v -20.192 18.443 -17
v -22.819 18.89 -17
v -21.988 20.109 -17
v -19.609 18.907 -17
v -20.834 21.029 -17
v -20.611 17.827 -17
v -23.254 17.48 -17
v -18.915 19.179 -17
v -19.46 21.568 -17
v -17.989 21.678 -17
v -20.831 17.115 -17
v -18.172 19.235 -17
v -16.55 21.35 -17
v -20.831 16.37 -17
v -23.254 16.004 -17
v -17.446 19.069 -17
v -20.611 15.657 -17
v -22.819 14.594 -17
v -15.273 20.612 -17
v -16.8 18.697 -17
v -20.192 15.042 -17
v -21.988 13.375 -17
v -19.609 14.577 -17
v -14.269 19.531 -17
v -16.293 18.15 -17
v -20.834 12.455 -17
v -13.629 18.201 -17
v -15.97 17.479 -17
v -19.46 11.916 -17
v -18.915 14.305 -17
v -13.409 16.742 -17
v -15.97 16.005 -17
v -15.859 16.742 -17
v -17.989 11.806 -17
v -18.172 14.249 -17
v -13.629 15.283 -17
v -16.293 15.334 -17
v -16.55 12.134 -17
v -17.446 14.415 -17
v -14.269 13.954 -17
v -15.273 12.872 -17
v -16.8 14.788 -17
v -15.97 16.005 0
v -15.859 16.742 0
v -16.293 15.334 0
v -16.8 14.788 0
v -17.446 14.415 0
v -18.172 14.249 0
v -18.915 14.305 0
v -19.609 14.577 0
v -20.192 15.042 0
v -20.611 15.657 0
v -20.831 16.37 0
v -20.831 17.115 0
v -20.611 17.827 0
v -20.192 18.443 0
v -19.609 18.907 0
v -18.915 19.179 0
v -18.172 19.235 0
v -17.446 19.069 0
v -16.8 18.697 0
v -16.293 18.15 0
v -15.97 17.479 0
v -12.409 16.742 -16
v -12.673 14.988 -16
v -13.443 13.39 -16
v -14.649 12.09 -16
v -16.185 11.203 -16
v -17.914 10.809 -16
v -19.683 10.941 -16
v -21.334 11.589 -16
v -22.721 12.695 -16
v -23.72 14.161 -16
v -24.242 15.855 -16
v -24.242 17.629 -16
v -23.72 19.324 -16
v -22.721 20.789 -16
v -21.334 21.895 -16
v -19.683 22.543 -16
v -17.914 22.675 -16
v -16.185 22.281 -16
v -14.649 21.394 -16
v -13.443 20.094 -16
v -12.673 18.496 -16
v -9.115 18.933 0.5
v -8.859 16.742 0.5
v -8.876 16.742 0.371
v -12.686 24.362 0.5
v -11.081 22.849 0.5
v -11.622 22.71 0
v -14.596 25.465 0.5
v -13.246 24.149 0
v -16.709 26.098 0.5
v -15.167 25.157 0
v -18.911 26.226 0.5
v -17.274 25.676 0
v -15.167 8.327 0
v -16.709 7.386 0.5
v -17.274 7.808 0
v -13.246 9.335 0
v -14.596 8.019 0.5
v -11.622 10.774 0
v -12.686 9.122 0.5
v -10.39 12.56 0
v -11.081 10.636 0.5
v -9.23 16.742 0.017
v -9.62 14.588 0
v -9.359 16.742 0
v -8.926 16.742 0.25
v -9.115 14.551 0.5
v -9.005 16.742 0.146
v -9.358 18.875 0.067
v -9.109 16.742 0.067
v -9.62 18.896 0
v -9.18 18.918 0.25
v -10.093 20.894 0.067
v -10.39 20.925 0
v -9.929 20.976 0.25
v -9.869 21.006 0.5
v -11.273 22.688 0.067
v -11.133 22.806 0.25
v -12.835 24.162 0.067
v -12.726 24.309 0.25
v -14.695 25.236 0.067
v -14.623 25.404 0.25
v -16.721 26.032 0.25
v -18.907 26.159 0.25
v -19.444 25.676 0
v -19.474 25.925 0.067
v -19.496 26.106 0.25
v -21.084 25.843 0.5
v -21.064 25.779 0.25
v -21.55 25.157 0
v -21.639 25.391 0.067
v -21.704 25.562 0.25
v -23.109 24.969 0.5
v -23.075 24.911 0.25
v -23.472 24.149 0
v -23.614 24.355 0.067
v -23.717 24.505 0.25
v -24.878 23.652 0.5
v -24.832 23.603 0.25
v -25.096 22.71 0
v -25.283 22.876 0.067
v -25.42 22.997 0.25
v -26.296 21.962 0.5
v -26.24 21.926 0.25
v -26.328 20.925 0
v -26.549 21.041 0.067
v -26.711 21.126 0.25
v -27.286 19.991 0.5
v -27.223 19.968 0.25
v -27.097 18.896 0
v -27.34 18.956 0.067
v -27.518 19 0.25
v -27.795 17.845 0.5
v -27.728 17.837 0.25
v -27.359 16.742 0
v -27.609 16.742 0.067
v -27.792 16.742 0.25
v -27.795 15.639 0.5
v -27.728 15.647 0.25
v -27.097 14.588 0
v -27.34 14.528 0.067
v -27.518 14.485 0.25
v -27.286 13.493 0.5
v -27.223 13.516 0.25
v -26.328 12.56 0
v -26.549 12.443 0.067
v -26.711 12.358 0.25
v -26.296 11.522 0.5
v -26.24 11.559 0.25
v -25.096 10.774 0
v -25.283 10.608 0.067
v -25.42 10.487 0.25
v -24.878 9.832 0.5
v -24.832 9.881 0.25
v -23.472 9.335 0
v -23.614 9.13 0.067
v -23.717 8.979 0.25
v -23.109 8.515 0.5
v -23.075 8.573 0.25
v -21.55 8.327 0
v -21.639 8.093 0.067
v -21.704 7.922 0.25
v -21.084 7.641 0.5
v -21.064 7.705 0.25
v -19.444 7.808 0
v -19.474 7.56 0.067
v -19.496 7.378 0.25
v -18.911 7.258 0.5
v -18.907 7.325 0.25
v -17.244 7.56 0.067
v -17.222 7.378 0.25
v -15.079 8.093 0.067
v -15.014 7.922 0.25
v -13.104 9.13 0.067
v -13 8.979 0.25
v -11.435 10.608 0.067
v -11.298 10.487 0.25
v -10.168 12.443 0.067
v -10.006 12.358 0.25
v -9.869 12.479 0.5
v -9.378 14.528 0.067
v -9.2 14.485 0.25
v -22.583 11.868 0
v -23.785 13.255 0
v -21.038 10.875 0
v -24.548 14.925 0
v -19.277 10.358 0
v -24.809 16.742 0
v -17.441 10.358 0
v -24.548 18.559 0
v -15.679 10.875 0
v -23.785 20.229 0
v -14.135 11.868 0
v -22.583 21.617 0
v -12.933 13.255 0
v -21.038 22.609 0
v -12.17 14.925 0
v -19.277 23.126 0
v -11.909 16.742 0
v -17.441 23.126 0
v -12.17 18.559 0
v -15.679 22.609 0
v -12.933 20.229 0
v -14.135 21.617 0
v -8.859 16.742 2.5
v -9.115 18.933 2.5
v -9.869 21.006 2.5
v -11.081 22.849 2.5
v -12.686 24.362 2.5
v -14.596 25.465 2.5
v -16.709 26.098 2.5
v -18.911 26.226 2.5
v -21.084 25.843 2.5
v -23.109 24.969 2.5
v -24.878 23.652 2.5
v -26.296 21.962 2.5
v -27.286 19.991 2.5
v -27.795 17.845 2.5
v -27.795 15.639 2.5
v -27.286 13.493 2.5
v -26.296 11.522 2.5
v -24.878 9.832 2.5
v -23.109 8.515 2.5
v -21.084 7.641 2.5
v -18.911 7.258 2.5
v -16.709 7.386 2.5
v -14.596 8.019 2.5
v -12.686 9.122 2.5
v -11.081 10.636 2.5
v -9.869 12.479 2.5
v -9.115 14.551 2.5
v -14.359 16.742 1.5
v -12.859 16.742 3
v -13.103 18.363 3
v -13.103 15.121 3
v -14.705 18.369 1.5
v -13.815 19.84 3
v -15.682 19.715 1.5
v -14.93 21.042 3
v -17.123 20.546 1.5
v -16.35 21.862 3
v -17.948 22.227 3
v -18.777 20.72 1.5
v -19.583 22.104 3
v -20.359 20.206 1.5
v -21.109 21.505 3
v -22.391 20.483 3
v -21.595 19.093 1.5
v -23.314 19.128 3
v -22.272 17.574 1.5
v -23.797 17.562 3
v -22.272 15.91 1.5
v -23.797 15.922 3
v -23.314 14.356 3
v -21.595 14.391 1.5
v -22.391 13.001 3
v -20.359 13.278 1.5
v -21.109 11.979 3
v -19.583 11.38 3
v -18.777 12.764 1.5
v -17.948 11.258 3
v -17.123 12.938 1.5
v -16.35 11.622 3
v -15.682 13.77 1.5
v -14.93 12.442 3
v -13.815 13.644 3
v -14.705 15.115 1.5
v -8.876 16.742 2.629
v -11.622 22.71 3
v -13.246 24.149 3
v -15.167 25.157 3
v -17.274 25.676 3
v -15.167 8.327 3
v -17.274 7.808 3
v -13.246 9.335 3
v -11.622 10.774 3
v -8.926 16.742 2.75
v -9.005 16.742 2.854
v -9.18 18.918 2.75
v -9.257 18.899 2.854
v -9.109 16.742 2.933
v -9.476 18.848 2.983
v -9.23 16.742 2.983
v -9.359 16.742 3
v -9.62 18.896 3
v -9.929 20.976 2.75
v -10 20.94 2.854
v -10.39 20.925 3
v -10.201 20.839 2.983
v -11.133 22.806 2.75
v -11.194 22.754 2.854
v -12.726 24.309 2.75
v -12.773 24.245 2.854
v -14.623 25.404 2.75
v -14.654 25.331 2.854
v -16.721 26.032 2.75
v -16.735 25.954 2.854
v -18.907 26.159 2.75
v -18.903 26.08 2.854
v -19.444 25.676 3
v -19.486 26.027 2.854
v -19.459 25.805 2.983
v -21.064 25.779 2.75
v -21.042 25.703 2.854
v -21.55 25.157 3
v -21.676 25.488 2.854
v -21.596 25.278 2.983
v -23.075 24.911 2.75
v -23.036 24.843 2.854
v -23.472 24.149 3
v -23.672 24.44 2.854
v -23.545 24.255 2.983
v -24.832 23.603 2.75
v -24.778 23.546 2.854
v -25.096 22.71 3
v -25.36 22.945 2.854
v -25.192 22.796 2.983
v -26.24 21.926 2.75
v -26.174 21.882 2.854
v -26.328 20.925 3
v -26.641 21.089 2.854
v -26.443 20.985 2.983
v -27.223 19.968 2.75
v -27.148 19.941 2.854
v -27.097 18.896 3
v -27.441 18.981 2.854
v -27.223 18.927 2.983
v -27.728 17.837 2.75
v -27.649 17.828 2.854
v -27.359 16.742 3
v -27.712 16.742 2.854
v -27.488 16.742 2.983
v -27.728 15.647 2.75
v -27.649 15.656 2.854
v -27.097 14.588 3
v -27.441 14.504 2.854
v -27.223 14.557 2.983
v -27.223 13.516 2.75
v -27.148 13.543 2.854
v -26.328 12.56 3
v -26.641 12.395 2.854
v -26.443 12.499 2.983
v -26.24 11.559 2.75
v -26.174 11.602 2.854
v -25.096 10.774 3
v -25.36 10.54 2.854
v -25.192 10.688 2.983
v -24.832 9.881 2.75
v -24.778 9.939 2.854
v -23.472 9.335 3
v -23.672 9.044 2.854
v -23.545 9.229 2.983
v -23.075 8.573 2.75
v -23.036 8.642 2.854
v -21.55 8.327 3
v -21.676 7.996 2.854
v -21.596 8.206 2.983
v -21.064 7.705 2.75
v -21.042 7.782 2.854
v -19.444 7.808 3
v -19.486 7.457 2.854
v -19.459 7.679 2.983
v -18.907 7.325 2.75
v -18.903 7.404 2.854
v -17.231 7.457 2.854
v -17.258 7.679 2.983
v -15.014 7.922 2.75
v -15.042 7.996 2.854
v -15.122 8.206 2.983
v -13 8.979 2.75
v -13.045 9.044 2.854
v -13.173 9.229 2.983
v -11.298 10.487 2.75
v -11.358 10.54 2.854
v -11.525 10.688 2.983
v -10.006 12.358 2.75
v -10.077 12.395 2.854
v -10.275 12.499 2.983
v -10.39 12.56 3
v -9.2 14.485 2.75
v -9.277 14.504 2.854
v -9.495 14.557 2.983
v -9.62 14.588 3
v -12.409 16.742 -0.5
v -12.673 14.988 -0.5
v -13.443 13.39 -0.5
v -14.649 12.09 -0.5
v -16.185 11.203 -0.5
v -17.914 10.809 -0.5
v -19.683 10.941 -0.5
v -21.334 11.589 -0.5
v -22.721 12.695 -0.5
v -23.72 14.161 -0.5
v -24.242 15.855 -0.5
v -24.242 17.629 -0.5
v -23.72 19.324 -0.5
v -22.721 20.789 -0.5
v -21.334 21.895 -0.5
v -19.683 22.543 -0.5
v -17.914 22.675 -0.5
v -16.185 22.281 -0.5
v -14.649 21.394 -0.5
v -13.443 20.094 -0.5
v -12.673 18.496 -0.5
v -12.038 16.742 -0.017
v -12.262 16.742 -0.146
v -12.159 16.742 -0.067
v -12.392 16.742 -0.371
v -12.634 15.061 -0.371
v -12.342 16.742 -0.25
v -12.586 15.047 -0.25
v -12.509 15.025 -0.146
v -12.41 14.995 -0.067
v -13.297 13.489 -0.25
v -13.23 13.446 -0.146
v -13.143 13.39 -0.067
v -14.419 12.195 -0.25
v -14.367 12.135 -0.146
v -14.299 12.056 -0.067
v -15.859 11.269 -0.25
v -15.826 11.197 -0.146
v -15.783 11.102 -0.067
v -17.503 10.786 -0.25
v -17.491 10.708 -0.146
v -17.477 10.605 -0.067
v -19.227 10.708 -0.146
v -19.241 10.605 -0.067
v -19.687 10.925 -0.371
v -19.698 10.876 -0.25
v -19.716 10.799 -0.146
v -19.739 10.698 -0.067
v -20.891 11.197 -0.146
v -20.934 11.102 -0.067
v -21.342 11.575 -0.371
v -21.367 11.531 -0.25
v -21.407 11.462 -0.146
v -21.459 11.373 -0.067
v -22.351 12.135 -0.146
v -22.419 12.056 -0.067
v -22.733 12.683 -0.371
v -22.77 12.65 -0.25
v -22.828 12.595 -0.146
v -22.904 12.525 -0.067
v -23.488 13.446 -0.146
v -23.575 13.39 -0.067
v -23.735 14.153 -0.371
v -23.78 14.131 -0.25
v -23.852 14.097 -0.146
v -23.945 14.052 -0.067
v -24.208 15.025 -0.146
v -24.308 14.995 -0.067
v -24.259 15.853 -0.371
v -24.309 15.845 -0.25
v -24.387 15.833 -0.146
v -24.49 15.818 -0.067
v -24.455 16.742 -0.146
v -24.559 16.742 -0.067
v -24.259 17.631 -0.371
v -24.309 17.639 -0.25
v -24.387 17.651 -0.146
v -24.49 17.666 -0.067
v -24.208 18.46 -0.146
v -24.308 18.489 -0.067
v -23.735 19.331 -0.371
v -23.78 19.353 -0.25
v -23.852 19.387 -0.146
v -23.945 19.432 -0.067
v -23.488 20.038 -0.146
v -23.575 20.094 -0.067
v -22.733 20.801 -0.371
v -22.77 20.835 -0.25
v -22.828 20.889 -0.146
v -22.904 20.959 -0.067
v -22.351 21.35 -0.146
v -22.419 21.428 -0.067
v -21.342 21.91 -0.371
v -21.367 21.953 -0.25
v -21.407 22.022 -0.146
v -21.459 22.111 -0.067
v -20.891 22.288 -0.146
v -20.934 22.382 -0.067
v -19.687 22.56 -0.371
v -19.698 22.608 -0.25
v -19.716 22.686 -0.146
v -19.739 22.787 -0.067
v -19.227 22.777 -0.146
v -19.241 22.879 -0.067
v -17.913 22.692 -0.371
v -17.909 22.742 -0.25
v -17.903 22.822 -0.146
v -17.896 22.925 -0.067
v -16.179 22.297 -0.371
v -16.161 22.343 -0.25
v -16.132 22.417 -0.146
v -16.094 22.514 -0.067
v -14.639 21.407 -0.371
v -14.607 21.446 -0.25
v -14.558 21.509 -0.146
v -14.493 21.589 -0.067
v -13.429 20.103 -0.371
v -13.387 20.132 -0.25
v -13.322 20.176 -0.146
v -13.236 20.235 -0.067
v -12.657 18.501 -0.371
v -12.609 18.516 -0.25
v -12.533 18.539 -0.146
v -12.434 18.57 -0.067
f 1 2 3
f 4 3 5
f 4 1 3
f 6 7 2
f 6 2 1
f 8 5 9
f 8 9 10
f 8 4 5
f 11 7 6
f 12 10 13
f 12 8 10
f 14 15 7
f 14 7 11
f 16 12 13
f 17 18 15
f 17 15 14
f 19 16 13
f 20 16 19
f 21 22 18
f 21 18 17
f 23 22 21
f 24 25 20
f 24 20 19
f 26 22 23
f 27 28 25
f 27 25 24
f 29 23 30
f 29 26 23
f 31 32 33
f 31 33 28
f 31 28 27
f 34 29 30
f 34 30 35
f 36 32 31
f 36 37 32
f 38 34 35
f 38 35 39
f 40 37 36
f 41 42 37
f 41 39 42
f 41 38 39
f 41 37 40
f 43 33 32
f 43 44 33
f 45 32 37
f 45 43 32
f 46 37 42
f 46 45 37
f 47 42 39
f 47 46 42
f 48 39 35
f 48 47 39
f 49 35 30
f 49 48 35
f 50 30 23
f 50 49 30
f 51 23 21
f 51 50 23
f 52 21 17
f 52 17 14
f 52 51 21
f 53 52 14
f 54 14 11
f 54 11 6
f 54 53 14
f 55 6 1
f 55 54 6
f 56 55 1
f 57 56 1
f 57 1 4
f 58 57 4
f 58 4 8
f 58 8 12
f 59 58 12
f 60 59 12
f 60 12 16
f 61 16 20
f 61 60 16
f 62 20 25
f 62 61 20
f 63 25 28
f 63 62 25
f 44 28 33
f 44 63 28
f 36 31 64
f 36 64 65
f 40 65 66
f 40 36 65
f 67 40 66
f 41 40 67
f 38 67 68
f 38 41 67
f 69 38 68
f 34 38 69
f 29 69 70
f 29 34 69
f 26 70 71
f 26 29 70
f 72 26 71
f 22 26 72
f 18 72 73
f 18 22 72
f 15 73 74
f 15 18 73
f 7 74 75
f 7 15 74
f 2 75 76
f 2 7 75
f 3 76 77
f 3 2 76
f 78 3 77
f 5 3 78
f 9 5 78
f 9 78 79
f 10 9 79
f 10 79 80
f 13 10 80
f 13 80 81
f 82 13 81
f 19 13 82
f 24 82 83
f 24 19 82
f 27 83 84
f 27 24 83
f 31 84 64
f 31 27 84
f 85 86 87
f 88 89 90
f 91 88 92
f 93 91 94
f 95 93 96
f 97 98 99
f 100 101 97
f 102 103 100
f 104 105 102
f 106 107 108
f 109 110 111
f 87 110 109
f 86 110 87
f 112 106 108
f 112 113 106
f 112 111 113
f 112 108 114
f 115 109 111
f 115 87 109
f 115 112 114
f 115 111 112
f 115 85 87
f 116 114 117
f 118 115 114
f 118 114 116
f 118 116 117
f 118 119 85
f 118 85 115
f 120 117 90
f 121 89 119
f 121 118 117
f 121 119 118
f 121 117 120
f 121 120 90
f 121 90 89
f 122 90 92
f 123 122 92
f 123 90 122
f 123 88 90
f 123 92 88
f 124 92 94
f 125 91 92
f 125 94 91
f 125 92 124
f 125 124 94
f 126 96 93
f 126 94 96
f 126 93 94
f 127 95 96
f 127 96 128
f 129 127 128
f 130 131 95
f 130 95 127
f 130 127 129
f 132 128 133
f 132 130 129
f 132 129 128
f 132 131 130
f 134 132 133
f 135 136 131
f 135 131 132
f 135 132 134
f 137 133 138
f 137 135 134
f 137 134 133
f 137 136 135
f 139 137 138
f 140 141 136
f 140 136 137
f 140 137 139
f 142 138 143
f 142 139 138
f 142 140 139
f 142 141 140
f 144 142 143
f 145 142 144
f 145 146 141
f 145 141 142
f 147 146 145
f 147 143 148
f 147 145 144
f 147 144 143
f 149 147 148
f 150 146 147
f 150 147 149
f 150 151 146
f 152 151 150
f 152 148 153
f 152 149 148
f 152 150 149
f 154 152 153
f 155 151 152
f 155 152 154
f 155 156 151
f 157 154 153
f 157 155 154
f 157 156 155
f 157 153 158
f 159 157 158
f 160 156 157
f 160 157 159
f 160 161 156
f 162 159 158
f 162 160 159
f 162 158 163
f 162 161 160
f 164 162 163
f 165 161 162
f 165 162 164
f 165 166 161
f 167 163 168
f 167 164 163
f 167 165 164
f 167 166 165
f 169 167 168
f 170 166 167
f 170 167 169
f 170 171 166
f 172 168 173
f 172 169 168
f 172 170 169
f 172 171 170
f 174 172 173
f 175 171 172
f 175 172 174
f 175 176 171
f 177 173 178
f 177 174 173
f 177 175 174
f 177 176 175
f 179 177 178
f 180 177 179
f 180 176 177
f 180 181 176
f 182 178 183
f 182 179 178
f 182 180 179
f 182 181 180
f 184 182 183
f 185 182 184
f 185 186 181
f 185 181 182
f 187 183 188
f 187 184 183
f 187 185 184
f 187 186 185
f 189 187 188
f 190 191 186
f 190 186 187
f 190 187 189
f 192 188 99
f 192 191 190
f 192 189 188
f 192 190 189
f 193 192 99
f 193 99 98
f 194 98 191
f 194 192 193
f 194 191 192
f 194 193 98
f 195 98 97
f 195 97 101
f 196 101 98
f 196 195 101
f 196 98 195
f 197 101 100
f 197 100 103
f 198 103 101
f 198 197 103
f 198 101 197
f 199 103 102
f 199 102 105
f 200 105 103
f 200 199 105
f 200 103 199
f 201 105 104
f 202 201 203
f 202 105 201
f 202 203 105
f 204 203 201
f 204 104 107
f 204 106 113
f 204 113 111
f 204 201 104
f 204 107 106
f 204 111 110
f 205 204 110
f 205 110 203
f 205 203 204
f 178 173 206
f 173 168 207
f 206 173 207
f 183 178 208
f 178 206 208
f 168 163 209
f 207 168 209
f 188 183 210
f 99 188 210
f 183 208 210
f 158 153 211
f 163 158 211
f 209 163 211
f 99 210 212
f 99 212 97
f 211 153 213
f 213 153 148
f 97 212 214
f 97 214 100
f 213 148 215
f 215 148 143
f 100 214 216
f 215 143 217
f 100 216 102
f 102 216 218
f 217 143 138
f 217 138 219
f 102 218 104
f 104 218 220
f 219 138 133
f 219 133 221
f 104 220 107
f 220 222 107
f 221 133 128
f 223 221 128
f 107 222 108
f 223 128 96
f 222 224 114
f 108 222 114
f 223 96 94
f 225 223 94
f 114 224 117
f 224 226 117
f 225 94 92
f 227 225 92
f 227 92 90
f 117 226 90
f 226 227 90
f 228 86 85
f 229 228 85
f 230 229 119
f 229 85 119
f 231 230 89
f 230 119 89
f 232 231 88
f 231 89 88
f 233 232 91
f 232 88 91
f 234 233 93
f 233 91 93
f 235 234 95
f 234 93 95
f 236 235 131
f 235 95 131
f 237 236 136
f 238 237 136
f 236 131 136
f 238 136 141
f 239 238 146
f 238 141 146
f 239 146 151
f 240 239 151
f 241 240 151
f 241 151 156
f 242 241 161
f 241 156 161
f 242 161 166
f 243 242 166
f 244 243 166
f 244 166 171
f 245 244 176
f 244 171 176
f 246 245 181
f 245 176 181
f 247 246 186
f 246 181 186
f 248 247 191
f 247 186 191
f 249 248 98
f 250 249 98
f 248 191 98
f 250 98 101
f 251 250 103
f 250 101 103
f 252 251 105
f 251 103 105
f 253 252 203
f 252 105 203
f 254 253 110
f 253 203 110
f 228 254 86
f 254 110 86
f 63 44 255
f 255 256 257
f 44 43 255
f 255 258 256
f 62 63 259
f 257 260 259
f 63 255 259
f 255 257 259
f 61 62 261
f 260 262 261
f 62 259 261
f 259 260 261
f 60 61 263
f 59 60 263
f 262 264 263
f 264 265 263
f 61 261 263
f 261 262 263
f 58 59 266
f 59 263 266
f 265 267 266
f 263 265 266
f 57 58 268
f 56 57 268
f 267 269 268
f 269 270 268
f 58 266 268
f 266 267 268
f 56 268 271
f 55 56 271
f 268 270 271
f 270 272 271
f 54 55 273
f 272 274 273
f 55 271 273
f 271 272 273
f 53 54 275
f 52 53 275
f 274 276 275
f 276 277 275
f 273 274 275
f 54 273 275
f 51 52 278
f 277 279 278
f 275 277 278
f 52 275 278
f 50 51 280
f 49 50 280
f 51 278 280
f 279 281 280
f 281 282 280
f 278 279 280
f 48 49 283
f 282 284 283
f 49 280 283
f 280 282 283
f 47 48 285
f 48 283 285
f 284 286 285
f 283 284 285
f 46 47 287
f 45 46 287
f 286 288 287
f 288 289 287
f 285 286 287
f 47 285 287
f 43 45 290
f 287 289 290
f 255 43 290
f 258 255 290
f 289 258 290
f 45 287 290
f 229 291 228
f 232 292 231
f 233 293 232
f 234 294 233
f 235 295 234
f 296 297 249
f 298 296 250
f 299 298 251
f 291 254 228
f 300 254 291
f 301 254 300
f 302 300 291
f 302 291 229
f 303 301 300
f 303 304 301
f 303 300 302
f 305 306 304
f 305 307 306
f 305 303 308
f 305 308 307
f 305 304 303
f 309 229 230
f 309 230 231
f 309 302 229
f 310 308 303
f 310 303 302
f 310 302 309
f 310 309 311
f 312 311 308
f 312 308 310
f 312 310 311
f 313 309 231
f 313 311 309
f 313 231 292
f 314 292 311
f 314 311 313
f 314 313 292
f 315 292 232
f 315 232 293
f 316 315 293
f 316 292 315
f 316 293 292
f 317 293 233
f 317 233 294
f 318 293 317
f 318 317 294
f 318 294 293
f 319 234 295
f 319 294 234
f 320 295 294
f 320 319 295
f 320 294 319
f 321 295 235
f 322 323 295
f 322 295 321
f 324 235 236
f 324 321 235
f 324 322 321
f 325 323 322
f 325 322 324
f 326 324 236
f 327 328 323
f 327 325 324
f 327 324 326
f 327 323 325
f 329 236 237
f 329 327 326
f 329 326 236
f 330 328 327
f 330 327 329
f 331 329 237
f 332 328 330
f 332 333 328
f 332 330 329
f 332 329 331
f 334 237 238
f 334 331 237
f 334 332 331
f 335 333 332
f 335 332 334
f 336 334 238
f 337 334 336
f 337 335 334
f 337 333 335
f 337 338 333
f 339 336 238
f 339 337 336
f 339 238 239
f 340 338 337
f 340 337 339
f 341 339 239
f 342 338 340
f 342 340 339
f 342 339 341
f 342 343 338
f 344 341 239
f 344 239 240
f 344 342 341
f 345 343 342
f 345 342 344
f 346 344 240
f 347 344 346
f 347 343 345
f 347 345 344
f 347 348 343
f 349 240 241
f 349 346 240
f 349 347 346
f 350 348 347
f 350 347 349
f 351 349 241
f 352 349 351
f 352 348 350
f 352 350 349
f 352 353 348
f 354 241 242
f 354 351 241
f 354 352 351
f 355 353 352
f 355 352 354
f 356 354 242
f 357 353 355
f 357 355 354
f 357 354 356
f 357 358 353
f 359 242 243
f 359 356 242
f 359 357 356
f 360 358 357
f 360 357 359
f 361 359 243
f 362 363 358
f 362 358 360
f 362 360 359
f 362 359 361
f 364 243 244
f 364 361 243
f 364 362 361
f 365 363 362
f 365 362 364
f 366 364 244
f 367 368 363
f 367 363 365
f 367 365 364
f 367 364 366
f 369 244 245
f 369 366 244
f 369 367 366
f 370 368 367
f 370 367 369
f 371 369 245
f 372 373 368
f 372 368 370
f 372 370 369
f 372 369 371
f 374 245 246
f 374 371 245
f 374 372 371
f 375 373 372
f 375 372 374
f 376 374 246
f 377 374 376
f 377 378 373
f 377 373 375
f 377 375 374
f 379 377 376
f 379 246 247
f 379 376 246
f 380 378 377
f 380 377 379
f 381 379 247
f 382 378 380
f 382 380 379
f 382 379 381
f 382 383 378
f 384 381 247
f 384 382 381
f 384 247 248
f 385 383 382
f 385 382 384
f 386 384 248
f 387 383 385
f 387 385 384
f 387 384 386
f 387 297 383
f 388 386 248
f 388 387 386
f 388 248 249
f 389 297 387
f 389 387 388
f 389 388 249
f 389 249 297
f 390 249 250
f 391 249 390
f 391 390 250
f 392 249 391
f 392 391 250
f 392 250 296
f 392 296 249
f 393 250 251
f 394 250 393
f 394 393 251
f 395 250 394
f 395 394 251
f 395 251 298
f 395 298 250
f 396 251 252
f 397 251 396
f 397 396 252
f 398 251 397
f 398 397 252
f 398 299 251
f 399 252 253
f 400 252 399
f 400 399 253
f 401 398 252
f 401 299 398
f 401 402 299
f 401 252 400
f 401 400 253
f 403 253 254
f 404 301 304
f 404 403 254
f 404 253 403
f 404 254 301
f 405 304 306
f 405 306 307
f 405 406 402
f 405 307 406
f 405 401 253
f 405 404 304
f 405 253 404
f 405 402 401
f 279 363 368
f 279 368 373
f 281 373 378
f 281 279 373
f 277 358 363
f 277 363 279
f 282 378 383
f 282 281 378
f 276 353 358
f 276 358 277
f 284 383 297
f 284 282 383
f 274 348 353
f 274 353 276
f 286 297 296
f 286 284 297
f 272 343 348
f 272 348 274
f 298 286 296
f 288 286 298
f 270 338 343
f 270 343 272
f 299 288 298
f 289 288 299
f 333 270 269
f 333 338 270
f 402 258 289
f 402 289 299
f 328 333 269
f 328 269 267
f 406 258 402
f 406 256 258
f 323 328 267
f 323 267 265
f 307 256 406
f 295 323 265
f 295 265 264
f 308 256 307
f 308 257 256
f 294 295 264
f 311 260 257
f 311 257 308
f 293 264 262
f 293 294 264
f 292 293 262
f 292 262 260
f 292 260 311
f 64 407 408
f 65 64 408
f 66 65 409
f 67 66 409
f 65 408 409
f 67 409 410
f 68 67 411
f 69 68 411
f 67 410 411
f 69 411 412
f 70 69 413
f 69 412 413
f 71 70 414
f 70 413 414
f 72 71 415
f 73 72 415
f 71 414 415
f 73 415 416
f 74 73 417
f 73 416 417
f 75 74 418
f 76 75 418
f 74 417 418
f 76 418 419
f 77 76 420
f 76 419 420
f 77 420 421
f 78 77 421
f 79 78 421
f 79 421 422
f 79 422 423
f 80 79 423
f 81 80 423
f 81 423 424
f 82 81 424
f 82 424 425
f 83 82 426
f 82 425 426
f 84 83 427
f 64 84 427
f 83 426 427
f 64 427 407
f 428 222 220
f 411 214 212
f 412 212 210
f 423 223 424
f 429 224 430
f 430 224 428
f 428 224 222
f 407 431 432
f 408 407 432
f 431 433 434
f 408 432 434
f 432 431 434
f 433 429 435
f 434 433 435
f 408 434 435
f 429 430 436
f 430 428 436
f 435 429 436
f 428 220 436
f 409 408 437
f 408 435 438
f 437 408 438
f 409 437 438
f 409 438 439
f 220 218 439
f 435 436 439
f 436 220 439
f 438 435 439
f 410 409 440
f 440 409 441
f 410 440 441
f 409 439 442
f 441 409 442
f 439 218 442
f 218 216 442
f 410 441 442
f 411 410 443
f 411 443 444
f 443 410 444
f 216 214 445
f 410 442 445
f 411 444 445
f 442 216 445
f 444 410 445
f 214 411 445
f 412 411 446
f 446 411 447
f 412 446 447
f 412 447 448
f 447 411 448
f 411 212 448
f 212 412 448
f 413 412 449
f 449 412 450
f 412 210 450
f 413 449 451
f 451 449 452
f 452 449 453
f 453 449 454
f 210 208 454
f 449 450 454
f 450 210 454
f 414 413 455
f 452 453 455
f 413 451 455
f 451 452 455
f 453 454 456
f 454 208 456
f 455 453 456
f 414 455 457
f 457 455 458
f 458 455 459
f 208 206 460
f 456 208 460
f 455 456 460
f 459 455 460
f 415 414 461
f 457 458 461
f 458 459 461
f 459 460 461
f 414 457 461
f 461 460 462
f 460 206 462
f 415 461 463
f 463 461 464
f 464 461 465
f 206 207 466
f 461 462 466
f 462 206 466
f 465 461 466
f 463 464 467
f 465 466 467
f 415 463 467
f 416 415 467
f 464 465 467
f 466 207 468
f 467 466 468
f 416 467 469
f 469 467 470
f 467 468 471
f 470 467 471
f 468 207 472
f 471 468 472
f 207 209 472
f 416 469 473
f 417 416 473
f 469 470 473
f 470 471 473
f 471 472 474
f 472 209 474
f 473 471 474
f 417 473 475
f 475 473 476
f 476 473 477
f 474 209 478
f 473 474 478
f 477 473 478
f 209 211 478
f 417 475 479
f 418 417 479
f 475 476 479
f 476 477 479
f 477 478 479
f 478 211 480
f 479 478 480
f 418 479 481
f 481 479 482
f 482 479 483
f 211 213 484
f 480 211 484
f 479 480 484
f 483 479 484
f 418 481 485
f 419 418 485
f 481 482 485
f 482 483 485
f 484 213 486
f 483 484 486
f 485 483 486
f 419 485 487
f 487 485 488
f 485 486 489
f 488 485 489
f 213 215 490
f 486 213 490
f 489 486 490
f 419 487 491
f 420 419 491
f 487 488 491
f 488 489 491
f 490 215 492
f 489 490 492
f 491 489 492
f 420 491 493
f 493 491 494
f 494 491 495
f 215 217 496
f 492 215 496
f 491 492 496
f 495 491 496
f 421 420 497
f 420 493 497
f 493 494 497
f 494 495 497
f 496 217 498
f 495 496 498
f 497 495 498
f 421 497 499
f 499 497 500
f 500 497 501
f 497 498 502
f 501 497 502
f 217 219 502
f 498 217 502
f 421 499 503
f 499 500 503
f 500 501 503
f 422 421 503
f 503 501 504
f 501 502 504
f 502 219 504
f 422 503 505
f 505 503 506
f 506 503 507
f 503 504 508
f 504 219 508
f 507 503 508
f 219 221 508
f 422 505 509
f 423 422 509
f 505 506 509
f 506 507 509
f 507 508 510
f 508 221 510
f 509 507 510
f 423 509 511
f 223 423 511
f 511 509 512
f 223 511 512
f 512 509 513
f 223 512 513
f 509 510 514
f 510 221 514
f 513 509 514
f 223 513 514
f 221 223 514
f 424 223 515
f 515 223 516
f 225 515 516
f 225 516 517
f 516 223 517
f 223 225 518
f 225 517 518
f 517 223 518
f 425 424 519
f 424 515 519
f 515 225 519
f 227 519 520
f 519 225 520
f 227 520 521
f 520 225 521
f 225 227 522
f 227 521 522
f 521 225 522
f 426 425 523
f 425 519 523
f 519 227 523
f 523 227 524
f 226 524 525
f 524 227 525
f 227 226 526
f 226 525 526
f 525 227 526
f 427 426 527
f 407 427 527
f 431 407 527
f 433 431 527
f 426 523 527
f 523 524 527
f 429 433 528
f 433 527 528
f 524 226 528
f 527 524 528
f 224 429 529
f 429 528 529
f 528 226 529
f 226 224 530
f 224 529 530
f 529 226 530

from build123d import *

# Parameters (mm, degrees)
F0_R     = 9.5
F0_R_2   = 2.5
F1_DEPTH = 3
F2_SIZE  = 2.99999
F3_R     = 5.95
F3_R_2   = 2.5
F4_DEPTH = 17
F5_SIZE  = 1
F6_R     = 0.5


# Not quite as in the source:
# - a fillet or chamfer is up to 0.001 mm smaller than in the source, because OpenCascade refuses the exact size
# - a feature names something its author has since deleted; it is built from what else it names


with BuildPart() as f1:
    # F0 (on Top) → F1 (new body)
    with BuildSketch(Plane.XY):
        with Locations((-18.3589216322, 16.7421158403)):
            Circle(F0_R)
        with Locations((-18.3589216322, 16.7421158403)):
            Circle(F0_R_2, mode=Mode.SUBTRACT)
    extrude(amount=F1_DEPTH)

    # F2 (size 3 in the source; OpenCascade refuses exactly that, so slightly less here)
    f2_edges = [f1.edges().sort_by_distance(p)[0] for p in [
        (-20.858922, 16.742116, 3),
    ]]
    chamfer(f2_edges, length=F2_SIZE)

    # F3 (on face) → F4 (join)
    with BuildSketch(Plane(origin=(0, 0, 0), x_dir=(1, 0, 0), z_dir=(0, 0, -1))):
        with Locations((-18.3589216322, -16.7421158403)):
            Circle(F3_R)
        with Locations((-18.3589216322, -16.7421158403)):
            Circle(F3_R_2, mode=Mode.SUBTRACT)
    extrude(amount=F4_DEPTH)

    # F5
    f5_edges = [f1.edges().sort_by_distance(p)[0] for p in [
        (-24.308922, 16.742116, -17),
    ]]
    chamfer(f5_edges, length=F5_SIZE)

    # F6
    f6_edges = [f1.edges().sort_by_distance(p)[0] for p in [
        (-27.858922, 16.742116, 0),
        (-27.858922, 16.742116, 3),
        (-24.308922, 16.742116, 0),
    ]]
    fillet(f6_edges, radius=F6_R)


solid = f1.part
